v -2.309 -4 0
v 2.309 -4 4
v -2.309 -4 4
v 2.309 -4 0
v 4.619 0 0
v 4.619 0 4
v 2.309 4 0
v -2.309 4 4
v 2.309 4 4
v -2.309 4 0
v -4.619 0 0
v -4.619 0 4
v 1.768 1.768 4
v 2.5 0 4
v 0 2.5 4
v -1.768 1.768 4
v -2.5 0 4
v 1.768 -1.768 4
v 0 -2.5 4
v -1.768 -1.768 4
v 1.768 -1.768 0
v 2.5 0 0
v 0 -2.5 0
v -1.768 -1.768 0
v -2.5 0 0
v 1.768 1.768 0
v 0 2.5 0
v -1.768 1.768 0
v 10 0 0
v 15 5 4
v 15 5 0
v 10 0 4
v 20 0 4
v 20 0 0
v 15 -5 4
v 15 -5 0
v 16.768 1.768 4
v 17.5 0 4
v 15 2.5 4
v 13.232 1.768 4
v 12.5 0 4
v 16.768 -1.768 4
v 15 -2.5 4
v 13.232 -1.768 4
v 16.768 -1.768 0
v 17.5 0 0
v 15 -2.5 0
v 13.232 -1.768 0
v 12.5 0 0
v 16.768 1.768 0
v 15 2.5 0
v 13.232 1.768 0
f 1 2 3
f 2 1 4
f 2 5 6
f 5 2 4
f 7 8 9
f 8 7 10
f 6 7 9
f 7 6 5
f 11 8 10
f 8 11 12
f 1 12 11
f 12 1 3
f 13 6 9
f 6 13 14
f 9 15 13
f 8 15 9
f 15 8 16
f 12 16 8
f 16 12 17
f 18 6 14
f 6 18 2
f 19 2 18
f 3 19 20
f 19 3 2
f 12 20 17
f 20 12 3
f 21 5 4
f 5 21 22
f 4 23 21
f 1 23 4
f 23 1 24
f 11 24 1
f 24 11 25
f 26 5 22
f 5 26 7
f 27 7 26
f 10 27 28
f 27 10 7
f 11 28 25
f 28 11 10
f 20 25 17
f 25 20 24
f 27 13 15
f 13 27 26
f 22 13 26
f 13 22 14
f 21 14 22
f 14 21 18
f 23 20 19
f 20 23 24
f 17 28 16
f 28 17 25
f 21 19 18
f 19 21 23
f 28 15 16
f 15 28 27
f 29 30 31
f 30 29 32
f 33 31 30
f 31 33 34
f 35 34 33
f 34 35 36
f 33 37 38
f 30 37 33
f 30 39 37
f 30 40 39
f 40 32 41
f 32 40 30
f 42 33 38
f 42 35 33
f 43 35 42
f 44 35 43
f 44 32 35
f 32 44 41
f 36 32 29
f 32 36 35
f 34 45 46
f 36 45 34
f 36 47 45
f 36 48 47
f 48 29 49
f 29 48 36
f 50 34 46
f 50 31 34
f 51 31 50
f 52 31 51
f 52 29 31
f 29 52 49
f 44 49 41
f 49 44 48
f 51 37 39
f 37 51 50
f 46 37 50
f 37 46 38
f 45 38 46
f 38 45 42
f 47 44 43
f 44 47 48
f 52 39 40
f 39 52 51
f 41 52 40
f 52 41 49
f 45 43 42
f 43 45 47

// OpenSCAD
// Zweck: Sechskantmutter M5 – $fn = 6 am Aufruf erzeugt das Sechseck, die Bohrung ist rund.
s = 8;            // Schlüsselweite
m = 4;            // Höhe
d_hole = 5;
e = s / cos(30);  // Eckmaß
echo(eckmass = e);
difference() {
    cylinder(h = m, d = e, $fn = 6);
    translate([0, 0, -1]) cylinder(h = m + 2, d = d_hole);
}
// Unterlegscheibe daneben, Quadratmutter ($fn = 4)
translate([15, 0, 0]) difference() {
    cylinder(h = m, r = 5, $fn = 4);
    translate([0, 0, -1]) cylinder(h = m + 2, d = d_hole);
}
